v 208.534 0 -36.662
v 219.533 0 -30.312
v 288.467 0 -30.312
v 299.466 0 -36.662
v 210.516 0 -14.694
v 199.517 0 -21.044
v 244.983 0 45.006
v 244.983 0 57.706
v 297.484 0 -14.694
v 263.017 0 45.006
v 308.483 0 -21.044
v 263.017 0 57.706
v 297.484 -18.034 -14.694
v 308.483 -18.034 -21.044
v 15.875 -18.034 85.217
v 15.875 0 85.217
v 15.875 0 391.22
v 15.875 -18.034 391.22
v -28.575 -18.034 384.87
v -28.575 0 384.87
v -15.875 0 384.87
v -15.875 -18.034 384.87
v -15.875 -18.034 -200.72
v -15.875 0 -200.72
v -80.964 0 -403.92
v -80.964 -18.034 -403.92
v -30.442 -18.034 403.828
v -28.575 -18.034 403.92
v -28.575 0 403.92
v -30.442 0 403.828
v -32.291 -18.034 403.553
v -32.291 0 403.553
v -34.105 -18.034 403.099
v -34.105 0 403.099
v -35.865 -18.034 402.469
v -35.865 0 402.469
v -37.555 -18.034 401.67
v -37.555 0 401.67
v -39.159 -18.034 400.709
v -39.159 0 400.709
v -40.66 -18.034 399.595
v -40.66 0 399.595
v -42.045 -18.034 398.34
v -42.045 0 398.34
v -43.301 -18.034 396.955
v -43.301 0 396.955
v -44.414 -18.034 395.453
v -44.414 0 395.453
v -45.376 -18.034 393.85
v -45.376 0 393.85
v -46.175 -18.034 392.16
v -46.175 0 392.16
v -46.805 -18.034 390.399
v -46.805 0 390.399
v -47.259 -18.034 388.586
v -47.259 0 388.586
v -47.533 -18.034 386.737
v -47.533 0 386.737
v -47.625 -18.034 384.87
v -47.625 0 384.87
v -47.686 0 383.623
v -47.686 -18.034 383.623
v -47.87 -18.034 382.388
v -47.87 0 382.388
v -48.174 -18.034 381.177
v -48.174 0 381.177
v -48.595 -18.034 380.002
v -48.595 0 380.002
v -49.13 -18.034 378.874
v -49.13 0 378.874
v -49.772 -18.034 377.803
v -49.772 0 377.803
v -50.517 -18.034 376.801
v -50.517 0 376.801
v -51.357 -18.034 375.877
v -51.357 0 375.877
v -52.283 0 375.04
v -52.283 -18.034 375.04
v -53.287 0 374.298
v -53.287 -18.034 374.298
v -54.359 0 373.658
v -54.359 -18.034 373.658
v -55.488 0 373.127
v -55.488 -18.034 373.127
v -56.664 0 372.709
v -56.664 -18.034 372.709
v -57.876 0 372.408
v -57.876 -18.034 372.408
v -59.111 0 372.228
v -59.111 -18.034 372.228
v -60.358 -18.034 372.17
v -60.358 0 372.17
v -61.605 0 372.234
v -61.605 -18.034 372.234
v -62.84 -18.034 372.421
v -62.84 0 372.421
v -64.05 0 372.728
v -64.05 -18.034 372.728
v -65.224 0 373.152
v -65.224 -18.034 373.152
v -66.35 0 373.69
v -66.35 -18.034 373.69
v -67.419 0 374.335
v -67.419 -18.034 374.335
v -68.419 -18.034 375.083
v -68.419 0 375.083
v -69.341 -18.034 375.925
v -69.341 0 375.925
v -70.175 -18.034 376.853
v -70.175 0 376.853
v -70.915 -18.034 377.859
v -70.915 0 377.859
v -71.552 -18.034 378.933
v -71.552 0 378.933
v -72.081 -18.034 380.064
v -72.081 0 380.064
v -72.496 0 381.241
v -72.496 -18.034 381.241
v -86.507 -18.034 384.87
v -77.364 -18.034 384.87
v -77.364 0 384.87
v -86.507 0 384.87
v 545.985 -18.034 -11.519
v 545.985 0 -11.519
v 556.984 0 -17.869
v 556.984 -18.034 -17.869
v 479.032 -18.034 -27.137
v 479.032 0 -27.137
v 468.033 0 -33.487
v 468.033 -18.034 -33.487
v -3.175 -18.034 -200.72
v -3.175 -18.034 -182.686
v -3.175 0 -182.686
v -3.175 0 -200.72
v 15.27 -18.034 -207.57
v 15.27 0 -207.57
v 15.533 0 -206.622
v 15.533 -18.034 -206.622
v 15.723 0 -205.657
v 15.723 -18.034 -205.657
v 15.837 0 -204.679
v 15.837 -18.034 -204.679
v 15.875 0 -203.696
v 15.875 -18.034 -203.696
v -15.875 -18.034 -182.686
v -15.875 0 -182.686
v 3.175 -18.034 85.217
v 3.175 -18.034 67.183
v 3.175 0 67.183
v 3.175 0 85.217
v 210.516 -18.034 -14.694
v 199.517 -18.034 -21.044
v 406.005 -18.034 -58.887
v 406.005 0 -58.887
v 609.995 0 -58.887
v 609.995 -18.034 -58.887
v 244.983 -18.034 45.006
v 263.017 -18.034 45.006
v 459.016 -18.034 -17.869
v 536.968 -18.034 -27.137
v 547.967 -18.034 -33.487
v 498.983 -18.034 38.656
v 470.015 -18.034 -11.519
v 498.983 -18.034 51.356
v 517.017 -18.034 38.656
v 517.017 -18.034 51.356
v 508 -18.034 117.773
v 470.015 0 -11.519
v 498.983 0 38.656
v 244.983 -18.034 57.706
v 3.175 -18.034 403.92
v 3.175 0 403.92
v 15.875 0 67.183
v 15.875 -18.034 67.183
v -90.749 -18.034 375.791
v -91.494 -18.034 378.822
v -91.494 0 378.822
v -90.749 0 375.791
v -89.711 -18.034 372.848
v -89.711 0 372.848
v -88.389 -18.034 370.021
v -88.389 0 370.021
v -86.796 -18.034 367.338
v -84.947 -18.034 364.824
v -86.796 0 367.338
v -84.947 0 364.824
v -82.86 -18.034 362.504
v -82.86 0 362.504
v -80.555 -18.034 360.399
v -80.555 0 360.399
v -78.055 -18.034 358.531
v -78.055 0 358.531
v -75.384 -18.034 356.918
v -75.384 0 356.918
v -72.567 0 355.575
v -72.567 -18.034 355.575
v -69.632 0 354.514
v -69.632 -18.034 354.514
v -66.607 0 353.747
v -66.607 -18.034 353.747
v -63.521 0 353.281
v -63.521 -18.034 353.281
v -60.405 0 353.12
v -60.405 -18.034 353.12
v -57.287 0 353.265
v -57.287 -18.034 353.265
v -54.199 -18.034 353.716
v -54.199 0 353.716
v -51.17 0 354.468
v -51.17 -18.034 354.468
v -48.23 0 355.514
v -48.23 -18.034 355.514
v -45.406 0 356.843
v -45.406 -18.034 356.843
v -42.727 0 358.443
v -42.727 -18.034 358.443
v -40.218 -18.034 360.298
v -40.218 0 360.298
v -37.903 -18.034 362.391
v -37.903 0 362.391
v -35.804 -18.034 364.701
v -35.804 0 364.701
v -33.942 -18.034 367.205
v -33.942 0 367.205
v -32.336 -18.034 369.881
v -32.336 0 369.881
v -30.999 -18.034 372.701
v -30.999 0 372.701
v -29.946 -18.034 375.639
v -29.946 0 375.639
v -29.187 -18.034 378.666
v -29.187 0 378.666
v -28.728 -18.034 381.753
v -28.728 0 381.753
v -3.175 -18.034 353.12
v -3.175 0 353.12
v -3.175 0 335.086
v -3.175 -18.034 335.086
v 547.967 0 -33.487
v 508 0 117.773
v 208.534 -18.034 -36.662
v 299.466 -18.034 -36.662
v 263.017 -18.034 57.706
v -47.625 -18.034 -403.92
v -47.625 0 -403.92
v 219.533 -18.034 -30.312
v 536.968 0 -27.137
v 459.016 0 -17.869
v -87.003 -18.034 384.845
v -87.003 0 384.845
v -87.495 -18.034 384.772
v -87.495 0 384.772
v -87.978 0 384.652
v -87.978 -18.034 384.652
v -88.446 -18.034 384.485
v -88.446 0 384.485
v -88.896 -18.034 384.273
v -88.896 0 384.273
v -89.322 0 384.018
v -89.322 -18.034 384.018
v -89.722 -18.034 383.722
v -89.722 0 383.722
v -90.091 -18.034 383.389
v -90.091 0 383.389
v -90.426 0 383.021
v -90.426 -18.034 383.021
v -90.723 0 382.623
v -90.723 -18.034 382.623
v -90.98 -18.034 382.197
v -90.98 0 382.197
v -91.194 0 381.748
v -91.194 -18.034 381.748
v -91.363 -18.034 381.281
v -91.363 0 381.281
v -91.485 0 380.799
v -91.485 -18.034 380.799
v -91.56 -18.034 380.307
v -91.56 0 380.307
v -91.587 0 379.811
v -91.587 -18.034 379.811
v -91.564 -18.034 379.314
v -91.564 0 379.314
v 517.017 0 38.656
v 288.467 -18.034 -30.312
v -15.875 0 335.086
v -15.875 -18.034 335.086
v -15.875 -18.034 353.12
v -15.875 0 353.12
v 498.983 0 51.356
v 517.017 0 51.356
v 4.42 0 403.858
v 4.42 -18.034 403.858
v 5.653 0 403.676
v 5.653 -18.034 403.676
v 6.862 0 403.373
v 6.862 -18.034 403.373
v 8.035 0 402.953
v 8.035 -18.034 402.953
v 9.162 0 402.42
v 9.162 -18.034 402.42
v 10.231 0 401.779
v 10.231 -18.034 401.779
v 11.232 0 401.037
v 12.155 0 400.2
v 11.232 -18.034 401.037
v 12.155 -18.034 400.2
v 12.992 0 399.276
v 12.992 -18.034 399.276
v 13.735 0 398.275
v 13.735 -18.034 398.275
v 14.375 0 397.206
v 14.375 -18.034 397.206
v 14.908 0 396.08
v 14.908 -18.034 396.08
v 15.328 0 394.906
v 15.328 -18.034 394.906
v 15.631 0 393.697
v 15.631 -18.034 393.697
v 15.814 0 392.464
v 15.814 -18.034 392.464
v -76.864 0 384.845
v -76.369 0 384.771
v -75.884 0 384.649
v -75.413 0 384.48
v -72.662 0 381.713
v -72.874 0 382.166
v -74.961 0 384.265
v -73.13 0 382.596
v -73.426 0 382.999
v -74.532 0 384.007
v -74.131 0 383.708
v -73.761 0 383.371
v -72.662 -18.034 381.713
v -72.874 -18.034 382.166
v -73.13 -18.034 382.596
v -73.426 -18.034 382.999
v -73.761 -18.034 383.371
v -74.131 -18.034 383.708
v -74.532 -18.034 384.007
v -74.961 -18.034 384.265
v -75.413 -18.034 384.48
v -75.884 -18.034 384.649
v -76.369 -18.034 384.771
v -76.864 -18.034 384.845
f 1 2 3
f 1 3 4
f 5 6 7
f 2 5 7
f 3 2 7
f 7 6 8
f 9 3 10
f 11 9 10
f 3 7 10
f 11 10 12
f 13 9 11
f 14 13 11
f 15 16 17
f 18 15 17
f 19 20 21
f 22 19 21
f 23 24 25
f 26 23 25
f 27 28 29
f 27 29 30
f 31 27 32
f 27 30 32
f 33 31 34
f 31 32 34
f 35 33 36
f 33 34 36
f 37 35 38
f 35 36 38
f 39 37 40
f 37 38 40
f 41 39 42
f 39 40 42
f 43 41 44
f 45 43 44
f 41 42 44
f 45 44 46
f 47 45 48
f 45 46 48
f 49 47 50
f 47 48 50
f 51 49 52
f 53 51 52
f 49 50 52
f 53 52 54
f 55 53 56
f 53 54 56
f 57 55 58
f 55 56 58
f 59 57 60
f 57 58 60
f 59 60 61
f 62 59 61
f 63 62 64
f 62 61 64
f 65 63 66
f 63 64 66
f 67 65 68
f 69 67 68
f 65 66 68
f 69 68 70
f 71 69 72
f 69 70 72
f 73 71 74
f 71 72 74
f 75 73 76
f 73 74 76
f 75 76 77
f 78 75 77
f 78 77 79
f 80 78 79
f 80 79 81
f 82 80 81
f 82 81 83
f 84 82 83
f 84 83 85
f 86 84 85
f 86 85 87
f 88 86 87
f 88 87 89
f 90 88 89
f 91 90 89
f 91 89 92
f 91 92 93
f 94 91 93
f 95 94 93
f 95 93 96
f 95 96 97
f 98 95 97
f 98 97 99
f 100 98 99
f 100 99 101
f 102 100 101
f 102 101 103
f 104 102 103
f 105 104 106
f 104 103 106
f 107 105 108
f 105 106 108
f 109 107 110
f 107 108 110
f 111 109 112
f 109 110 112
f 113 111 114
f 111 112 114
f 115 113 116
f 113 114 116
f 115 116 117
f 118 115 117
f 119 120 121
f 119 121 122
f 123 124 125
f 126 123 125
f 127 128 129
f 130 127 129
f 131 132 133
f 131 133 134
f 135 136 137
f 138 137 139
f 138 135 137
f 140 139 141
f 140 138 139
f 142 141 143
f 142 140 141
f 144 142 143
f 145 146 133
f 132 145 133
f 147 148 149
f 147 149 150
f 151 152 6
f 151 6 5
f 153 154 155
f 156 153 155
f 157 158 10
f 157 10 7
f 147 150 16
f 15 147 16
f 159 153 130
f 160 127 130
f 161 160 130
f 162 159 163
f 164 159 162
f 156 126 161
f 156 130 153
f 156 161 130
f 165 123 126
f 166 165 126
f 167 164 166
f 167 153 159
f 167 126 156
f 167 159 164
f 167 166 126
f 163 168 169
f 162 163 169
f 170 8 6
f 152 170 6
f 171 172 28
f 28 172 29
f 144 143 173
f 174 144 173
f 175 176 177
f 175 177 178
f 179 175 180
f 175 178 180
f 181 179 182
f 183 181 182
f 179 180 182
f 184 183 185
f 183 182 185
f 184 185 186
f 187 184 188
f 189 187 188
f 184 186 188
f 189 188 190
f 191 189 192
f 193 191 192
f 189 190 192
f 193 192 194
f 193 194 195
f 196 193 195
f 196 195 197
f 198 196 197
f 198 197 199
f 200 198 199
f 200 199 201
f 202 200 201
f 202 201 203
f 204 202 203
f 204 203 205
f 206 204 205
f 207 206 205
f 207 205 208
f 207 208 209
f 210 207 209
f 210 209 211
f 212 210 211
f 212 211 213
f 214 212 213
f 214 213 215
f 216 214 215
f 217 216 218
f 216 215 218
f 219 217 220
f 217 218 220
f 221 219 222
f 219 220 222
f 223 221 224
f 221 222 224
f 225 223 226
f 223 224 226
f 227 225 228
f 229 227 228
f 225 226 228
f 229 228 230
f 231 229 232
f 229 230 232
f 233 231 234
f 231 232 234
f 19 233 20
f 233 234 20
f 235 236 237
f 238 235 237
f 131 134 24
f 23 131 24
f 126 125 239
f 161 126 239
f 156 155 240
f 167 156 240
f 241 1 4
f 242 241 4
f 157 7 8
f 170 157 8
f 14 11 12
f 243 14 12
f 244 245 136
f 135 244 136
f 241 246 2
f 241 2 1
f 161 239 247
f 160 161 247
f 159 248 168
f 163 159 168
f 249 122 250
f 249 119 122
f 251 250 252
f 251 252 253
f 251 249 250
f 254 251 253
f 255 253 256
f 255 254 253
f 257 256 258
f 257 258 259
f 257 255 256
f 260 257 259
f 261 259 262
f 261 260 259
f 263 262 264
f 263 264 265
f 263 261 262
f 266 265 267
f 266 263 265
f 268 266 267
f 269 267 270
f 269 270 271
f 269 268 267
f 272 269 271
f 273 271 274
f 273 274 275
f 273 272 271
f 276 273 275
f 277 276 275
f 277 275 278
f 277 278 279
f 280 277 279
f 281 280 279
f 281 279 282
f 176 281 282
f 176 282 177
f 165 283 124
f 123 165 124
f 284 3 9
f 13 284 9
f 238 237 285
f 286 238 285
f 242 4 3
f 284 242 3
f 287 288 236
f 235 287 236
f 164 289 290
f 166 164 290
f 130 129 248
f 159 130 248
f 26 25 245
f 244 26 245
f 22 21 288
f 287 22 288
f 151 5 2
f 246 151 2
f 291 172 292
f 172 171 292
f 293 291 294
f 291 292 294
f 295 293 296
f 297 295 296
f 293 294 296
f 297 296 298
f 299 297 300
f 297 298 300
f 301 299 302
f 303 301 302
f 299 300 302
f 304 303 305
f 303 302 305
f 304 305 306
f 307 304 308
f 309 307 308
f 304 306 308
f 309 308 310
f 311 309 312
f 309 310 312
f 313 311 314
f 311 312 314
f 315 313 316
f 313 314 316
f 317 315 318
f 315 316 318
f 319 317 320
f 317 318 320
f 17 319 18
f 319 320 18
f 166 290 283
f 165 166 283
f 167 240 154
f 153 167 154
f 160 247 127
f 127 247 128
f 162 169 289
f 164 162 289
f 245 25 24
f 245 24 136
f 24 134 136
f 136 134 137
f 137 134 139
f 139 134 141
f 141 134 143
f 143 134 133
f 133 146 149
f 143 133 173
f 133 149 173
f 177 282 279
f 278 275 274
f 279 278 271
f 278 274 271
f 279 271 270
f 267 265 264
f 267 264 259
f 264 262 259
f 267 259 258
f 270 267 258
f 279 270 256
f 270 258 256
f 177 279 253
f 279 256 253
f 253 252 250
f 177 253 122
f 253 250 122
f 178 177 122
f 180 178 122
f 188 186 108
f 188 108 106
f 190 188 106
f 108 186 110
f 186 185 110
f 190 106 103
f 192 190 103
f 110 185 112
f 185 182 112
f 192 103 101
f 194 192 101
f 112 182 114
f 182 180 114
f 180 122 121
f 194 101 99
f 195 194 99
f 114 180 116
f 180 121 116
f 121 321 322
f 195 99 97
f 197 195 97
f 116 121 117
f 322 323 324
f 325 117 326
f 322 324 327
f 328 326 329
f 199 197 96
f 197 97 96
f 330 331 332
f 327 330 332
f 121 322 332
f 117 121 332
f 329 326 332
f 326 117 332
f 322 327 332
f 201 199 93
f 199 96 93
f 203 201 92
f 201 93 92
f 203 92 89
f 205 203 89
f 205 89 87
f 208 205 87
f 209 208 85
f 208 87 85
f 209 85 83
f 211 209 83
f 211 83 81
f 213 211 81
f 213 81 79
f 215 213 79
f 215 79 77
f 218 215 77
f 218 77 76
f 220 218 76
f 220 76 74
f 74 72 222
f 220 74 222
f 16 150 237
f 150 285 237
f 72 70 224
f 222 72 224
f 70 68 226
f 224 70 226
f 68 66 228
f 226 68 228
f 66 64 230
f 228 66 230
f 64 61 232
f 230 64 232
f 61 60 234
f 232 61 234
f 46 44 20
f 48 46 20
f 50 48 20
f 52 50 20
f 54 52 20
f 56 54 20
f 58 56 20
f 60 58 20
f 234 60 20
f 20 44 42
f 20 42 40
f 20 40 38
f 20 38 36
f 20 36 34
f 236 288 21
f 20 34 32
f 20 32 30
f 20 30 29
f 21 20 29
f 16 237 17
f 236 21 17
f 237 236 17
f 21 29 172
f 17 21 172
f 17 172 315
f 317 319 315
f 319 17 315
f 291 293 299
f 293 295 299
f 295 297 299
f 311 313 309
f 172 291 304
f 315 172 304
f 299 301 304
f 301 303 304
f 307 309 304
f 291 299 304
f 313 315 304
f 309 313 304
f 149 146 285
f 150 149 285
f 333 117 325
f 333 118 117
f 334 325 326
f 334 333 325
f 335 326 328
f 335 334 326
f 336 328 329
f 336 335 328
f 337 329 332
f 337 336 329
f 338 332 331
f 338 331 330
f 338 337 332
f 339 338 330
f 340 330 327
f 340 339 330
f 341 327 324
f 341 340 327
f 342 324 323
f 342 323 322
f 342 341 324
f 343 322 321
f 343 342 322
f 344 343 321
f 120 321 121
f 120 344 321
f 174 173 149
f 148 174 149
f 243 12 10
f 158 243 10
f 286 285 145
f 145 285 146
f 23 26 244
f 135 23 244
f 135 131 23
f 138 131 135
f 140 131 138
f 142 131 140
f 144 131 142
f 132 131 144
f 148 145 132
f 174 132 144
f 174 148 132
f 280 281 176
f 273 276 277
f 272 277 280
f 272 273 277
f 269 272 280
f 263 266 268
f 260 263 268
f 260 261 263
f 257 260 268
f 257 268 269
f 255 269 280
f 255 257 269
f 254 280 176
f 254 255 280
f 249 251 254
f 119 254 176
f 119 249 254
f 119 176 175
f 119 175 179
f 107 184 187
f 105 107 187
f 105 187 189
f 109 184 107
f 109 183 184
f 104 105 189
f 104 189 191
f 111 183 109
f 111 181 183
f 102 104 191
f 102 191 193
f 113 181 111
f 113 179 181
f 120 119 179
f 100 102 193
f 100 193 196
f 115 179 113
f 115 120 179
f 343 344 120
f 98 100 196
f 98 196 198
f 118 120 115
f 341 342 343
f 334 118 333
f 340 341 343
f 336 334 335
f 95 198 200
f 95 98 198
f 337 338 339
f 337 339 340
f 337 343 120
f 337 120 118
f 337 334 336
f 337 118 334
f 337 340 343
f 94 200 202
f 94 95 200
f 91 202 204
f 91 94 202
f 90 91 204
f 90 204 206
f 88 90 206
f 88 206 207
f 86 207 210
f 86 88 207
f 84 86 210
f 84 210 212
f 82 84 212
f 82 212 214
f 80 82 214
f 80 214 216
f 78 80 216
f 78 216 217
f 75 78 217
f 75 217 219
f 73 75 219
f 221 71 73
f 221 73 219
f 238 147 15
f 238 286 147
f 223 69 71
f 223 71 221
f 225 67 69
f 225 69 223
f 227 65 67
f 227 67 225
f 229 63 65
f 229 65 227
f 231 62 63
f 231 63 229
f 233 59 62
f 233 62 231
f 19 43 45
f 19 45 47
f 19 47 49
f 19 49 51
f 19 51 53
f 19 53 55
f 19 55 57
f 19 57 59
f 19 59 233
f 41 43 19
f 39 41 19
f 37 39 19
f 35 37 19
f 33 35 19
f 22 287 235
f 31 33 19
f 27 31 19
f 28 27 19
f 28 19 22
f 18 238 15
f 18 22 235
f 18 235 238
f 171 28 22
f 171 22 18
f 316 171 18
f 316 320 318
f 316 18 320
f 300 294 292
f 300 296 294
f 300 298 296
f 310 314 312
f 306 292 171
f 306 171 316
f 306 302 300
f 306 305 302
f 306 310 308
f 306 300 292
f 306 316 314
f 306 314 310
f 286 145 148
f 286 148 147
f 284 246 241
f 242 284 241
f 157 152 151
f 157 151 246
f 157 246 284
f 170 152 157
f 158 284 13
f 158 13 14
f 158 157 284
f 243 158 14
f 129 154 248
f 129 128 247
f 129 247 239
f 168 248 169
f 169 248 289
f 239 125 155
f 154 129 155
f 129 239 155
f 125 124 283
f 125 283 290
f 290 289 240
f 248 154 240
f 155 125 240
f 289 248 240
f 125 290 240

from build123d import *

# Parameters (mm, degrees)
F1_W     = 12.7
F1_H     = 19.05
F2_DEPTH = 18.034
F3_R     = 12.7
F4_R     = 5.08


# Not quite as in the source:
# - a variable given as a bare number and used for a length is read in inches; the dataset says mm whatever the document's units were


with BuildPart() as f2:
    # F1 (on Front) → F2 (new body)
    with BuildSketch(Plane.XZ):
        Polygon((15.875, 403.91953125), (-15.875, 403.91953125), (-15.875, 384.86953125), (-15.875, 353.11953125), (-3.175, 353.11953125), (-3.175, 335.08553125), (-15.875, 335.08553125), (-15.875, -182.68553125), (-3.175, -182.68553125), (-3.175, -200.71953125), (-15.875, -200.71953125), (-80.9640890891, -403.91953125), (-47.625, -403.91953125), (15.875, -205.68046875), (15.875, 67.183), (3.175, 67.183), (3.175, 76.2), (3.175, 85.217), (15.875, 85.217), align=None)
        with BuildLine():
            ThreePointArc((-92.075, 384.86953125), (-60.325, 353.11953125), (-28.575, 384.86953125))
            Line((-28.575, 384.86953125), (-47.625, 384.86953125))
            ThreePointArc((-47.625, 384.86953125), (-60.325, 372.16953125), (-73.025, 384.86953125))
            Line((-73.025, 384.86953125), (-92.075, 384.86953125))
        make_face()
        with BuildLine():
            Line((-28.575, 384.86953125), (-28.575, 403.91953125))
            ThreePointArc((-28.575, 403.91953125), (-42.0453841816, 398.3399154316), (-47.625, 384.86953125))
            Line((-47.625, 384.86953125), (-28.575, 384.86953125))
        make_face()
        with Locations((-22.225, 394.39453125)):
            Rectangle(F1_W, F1_H)
    extrude(amount=F2_DEPTH)

    # F3
    f3_edges = [f2.edges().sort_by_distance(p)[0] for p in [
        (15.875, -9.017, -205.680469),
        (15.875, -9.017, 403.919531),
    ]]
    fillet(f3_edges, radius=F3_R)

    # F4
    f4_edges = [f2.edges().sort_by_distance(p)[0] for p in [
        (-73.025, -9.017, 384.869531),
        (-92.075, -9.017, 384.869531),
    ]]
    fillet(f4_edges, radius=F4_R)


with BuildPart() as f2b:
    # F1 (on Front) → F2, piece 2 (new body)
    with BuildSketch(Plane.XZ):
        Polygon((208.534, -36.6617420935), (299.466, -36.6617420935), (288.4674773719, -30.3117420935), (297.4844773719, -14.6938399617), (308.483, -21.0438399617), (263.017, 57.7055820552), (263.017, 45.0055820552), (244.983, 45.0055820552), (244.983, 57.7055820552), (199.517, -21.0438399617), (210.5155226281, -14.6938399617), (219.5325226281, -30.3117420935), align=None)
    extrude(amount=F2_DEPTH)


with BuildPart() as f2c:
    # F1 (on Front) → F2, piece 3 (new body)
    with BuildSketch(Plane.XZ):
        Polygon((406.0051708018, -58.8867420935), (609.9948291982, -58.8867420935), (508, 117.7734841871), align=None)
        Polygon((470.0147839421, -11.5188399617), (498.983, 38.6555820552), (498.983, 51.3555820552), (517.017, 51.3555820552), (517.017, 38.6555820552), (545.9852160579, -11.5188399617), (556.983738686, -17.8688399617), (547.966738686, -33.4867420935), (536.9682160579, -27.1367420935), (479.0317839421, -27.1367420935), (468.033261314, -33.4867420935), (459.016261314, -17.8688399617), align=None, mode=Mode.SUBTRACT)
    extrude(amount=F2_DEPTH)


solid = Compound([f2.part, f2b.part, f2c.part])
